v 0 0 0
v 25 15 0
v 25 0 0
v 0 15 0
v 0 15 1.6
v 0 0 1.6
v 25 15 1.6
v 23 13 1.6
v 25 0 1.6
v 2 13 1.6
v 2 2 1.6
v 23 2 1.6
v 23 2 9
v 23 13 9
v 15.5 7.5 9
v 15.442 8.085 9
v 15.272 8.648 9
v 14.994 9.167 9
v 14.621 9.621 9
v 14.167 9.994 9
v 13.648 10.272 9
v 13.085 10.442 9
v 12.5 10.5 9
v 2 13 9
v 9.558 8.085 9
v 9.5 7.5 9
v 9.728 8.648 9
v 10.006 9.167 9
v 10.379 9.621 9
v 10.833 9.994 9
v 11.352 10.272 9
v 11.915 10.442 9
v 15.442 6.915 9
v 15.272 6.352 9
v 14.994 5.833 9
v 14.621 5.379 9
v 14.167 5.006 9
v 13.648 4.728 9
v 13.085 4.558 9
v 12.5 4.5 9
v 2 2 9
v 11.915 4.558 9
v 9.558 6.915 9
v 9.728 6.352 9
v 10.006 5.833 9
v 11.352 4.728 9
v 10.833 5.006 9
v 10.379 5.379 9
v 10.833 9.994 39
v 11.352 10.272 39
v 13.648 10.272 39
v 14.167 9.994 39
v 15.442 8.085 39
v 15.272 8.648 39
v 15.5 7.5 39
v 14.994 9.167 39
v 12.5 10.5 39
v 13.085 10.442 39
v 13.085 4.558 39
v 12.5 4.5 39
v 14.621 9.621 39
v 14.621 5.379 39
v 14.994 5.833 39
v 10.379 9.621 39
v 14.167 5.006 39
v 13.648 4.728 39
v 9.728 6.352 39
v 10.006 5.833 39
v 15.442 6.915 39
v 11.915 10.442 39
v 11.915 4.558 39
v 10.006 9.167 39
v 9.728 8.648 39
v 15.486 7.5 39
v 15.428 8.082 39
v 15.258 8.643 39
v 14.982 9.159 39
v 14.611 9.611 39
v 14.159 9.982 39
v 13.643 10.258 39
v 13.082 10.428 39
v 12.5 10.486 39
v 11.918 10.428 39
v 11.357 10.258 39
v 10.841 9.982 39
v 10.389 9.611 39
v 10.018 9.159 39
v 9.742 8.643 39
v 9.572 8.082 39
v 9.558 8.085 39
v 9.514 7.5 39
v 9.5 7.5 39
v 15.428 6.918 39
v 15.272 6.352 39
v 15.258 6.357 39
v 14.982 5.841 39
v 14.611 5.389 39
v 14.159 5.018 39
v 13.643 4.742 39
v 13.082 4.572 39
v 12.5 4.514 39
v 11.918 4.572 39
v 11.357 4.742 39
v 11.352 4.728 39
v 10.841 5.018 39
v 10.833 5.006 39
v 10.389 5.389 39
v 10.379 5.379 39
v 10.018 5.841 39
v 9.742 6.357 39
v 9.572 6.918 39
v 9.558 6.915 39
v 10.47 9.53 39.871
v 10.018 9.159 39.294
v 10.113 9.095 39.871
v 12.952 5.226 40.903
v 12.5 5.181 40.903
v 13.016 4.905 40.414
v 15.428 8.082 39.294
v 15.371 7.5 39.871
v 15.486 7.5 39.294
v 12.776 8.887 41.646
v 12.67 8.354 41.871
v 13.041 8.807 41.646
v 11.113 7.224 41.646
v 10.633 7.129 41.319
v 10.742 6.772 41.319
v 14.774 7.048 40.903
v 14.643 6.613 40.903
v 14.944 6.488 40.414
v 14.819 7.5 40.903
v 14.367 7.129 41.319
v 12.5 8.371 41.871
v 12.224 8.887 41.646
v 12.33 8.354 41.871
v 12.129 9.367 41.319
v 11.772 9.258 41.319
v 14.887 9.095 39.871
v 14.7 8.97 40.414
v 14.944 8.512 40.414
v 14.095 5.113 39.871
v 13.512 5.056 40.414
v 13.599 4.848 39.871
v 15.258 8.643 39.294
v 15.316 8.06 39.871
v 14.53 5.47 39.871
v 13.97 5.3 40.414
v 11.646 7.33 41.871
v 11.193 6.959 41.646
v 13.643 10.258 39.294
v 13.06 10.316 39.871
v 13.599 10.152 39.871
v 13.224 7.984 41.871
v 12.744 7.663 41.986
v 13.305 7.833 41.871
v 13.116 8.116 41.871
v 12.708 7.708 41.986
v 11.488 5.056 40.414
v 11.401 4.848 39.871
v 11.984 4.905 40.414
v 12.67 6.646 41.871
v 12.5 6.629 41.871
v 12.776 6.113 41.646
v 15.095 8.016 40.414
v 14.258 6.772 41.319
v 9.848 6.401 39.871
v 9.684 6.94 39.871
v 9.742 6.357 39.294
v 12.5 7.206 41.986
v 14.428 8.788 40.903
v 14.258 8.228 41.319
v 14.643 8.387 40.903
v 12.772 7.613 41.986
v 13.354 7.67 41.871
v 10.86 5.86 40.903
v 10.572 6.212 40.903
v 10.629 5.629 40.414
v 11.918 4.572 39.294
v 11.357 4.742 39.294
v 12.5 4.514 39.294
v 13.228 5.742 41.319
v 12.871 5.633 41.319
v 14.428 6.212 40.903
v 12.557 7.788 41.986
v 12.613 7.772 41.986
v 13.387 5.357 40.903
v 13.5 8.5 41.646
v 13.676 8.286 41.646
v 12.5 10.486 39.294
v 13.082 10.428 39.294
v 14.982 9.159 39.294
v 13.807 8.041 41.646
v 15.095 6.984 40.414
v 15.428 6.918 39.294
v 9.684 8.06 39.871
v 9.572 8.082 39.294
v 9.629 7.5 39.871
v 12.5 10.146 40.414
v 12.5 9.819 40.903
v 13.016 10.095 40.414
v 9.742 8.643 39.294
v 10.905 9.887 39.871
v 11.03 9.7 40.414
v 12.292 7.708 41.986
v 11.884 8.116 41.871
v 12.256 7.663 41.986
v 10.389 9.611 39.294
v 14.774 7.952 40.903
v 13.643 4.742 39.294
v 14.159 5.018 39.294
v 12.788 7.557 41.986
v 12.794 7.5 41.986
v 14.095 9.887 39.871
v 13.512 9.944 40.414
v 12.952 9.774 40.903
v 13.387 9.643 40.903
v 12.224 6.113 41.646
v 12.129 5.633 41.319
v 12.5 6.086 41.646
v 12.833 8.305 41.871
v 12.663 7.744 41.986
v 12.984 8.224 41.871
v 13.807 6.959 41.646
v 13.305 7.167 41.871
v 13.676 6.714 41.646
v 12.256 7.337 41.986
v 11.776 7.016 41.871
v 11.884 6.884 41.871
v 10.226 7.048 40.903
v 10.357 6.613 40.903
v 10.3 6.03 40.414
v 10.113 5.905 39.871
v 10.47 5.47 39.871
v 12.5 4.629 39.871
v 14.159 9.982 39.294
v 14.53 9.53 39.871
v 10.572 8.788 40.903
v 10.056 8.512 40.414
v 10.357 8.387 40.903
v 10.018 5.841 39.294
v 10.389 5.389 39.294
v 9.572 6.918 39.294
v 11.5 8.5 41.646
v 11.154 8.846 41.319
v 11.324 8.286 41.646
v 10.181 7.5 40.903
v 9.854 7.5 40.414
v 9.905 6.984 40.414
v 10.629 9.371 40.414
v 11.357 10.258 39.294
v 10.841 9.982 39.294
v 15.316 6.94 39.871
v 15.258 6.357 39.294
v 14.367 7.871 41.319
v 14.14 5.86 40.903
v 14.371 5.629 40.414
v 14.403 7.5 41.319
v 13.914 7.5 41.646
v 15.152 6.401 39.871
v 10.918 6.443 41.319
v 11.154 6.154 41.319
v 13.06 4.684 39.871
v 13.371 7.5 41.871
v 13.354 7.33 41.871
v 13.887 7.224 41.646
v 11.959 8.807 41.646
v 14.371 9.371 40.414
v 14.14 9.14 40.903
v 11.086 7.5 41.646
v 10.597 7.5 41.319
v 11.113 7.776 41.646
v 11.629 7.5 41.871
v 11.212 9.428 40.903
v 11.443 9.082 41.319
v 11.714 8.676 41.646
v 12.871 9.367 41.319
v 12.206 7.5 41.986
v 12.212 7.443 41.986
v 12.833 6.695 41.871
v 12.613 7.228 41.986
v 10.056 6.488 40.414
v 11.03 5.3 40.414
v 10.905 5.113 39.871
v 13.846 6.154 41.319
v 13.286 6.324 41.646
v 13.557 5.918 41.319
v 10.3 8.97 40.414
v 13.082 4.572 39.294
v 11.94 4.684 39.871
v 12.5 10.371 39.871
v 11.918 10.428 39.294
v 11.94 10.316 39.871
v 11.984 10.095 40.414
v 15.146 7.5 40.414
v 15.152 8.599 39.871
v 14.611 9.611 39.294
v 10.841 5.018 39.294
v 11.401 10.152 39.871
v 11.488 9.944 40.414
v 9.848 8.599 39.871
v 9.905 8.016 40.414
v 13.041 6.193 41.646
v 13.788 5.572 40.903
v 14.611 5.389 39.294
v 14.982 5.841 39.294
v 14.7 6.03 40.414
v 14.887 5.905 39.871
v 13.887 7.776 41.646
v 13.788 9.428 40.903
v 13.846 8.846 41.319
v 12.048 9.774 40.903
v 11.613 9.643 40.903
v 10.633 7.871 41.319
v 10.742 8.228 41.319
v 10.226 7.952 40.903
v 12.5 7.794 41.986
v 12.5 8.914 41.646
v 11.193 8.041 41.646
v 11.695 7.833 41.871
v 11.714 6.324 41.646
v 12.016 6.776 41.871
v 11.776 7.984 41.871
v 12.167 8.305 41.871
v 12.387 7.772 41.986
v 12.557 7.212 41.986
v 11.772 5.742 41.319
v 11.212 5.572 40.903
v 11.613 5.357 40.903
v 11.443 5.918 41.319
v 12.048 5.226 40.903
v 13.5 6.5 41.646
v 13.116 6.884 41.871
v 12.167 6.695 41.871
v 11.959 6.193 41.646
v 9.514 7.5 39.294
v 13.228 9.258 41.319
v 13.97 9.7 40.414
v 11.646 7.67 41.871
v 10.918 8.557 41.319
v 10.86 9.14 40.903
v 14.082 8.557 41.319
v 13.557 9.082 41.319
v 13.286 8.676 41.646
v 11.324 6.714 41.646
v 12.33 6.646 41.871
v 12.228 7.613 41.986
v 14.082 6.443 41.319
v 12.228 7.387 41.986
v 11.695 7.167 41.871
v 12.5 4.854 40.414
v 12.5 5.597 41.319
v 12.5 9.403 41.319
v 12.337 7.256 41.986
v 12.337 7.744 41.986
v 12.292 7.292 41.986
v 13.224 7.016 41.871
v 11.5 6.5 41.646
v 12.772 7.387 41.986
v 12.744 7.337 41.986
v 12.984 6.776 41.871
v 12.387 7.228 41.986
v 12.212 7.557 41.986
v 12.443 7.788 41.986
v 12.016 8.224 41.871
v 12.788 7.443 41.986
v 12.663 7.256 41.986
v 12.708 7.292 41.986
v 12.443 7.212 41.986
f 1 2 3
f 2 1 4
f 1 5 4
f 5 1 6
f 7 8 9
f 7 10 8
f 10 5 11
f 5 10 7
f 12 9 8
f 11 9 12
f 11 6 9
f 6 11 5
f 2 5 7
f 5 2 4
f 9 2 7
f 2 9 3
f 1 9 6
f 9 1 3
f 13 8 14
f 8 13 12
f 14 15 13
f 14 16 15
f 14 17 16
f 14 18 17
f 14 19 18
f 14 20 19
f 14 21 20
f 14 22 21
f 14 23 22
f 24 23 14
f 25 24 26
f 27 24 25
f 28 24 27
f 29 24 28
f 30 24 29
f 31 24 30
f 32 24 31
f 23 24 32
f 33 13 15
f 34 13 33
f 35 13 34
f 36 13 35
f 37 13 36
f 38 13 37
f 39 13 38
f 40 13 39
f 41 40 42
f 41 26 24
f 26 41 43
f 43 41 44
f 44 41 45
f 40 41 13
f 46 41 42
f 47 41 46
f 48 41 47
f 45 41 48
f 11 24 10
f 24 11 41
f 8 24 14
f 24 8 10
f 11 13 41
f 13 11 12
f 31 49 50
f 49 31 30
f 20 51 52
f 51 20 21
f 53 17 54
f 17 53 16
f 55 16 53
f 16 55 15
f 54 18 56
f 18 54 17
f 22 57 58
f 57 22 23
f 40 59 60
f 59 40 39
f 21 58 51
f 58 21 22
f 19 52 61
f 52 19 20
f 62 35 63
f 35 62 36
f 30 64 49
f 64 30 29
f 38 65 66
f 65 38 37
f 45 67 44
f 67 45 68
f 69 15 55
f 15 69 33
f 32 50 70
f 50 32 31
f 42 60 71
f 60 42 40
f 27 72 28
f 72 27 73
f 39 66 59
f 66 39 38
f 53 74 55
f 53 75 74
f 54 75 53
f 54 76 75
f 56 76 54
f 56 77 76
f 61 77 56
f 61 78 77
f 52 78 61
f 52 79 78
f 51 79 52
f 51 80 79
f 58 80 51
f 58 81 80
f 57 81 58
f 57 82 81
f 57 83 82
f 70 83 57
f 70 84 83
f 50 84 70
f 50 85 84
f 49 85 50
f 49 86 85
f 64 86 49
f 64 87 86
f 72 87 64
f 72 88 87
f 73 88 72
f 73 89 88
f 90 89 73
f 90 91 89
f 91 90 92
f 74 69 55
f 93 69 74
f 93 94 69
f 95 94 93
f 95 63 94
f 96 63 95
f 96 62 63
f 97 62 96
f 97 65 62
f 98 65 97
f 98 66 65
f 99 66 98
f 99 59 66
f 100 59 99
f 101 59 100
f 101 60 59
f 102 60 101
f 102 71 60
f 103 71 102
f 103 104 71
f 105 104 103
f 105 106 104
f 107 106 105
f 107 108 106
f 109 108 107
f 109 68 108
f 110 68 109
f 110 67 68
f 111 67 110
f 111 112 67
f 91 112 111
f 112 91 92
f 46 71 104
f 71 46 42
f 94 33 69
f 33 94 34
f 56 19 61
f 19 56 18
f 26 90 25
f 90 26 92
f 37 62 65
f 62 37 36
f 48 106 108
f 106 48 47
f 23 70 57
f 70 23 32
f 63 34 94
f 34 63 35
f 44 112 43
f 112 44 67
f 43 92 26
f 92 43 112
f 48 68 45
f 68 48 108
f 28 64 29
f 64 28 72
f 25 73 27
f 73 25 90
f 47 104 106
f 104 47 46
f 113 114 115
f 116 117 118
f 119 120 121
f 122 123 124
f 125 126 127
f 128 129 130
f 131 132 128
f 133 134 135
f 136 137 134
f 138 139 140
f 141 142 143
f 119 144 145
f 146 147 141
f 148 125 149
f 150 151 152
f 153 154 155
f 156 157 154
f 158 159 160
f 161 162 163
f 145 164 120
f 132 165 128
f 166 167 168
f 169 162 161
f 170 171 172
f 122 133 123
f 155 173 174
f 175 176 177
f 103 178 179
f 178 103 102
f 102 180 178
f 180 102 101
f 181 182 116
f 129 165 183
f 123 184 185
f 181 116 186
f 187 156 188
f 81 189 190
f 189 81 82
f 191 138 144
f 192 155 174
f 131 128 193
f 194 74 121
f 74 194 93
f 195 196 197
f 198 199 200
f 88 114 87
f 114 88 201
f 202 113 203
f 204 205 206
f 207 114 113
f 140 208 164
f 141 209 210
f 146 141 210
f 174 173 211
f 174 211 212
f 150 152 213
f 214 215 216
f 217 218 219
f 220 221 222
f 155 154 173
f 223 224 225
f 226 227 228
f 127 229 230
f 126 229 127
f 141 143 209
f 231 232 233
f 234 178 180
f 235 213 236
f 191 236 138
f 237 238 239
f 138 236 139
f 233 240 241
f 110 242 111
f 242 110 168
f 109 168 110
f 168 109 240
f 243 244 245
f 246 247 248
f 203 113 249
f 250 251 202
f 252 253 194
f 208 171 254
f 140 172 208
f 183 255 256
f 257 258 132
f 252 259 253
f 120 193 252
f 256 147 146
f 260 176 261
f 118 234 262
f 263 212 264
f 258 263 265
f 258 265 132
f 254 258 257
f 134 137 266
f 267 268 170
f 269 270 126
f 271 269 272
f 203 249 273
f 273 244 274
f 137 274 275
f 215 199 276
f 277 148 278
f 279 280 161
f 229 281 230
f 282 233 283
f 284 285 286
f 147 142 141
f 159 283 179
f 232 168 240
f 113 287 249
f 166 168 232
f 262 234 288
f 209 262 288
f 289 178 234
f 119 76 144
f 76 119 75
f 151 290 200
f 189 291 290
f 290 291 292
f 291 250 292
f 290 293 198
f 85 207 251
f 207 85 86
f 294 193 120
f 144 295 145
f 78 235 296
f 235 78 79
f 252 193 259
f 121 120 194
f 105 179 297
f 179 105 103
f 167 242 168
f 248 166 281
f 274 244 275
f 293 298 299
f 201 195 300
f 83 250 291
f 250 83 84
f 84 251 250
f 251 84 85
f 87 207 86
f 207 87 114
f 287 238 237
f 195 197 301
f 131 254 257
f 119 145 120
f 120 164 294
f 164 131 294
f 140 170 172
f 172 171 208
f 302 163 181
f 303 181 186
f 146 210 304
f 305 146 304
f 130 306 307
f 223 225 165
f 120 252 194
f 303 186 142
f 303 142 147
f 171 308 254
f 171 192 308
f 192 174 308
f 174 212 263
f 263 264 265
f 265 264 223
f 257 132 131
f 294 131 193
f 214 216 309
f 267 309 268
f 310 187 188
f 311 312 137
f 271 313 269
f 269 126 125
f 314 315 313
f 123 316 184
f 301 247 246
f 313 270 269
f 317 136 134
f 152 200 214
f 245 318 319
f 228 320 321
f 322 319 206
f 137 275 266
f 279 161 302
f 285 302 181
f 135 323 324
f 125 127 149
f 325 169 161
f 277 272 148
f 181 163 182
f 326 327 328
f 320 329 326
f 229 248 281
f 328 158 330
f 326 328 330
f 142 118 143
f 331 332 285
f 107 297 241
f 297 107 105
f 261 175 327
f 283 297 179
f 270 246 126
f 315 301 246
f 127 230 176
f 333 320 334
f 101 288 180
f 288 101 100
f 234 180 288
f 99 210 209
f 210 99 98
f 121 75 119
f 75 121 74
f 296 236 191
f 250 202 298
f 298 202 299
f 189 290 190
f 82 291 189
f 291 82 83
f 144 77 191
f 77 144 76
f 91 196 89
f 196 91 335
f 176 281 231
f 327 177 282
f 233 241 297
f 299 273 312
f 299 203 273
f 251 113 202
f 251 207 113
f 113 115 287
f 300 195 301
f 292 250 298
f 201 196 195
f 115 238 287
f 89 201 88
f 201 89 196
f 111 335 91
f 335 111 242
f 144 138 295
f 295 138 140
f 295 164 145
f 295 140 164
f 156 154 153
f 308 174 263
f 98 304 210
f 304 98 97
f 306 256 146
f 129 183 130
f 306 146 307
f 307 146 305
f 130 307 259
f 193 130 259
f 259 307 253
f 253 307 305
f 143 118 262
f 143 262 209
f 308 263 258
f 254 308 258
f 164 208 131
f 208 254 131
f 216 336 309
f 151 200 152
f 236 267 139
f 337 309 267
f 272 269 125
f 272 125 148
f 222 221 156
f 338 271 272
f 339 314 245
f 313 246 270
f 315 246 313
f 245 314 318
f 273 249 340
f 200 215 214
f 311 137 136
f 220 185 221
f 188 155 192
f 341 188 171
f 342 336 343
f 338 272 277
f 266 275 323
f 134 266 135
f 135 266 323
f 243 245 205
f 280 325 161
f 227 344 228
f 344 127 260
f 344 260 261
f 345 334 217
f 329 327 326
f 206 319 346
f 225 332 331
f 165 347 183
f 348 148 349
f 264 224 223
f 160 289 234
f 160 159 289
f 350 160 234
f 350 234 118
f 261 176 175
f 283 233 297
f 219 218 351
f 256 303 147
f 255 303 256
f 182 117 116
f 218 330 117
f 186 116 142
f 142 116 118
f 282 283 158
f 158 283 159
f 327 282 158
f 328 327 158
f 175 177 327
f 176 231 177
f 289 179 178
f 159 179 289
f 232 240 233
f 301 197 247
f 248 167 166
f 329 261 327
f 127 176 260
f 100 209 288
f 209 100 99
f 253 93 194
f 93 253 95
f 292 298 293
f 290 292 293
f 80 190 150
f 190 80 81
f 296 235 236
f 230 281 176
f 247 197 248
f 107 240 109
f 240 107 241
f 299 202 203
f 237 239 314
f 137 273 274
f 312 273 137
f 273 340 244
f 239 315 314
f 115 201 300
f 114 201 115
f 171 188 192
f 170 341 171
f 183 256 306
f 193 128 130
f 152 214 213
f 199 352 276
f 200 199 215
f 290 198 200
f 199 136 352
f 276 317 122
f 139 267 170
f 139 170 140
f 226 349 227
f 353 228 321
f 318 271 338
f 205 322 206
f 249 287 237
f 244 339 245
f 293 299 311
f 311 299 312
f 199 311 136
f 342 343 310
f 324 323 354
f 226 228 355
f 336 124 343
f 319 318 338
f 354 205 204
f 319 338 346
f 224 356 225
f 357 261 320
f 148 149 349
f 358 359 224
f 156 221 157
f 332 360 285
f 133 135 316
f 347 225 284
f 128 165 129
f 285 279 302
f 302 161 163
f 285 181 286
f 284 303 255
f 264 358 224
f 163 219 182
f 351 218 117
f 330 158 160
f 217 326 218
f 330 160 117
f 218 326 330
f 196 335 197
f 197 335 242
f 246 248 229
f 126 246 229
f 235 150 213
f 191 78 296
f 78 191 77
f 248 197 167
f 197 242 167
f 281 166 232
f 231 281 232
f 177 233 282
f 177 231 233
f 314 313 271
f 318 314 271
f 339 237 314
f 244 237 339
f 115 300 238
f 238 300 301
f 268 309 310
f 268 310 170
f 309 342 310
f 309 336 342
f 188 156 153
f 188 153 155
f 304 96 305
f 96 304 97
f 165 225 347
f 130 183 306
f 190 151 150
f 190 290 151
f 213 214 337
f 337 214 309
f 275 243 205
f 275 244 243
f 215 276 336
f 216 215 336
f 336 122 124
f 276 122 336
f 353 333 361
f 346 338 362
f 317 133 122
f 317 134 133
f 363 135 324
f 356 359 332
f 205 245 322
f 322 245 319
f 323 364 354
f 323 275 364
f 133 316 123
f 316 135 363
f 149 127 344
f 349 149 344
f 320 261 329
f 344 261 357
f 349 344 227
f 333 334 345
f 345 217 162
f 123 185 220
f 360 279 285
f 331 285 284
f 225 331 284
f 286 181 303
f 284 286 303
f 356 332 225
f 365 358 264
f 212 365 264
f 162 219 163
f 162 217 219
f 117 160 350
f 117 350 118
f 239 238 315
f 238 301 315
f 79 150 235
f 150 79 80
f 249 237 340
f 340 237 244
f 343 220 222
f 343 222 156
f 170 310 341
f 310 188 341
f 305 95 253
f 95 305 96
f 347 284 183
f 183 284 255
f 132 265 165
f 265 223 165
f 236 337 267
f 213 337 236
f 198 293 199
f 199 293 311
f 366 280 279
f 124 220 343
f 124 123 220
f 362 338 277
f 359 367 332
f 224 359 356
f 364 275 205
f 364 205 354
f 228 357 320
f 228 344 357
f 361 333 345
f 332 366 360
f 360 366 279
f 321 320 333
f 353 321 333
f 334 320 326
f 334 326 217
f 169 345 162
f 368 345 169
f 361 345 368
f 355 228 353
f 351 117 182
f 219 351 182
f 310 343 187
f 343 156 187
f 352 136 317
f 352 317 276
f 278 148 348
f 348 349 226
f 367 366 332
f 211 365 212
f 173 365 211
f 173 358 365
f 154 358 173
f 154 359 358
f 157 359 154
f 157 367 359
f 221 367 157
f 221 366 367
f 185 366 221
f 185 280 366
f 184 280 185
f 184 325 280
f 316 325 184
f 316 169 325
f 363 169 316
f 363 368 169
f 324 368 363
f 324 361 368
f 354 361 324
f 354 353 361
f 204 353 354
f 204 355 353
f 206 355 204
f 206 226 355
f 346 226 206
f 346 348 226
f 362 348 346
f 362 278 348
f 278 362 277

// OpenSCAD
/* =============================================================================
 * 智慧香爐 — 外購元件：MAX6675 熱電偶轉換板 ＋ K 型探頭
 * =============================================================================
 * ★★ 這不是列印件，是外購品的示意模型 ★★
 * 尺寸來自 ../params.scad，★全為估值★。
 * 用途：組裝干涉檢查、螺絲可及性、目視確認裝得下。
 * ★不可當成實際尺寸寫進報告★（CLAUDE.md §7）
 *
 * 原點：轉換板左下角、z=0 為板底
 * ============================================================================= */

include <../params.scad>


module max6675_board() {
    color("#c0392b") linear_extrude(PCB_T) square([MAX6675_W, MAX6675_D]);
    color("#1a1a1a")
        translate([2, 2, PCB_T]) cube([MAX6675_W - 4, MAX6675_D - 4, MAX6675_H - PCB_T]);
}

// K 型探頭：★目前外觀 CAD 沒有任何支架把它固定在爐面上方★
// 交接文件要求懸於爐面上方 TC_TIP_ABOVE_BOWL，這裡把它畫出來，
// 是為了讓「缺少的支架」在組合件裡看得見，不是宣稱它已經有著落。
module tc_probe(len = 30) {
    color("#9aa0a6") cylinder(h = len, d = TC_PROBE_D, $fn = 32);
    color("#9aa0a6") translate([0, 0, len]) sphere(d = TC_PROBE_D, $fn = 32);
}

module max6675() {
    max6675_board();
    translate([MAX6675_W / 2, MAX6675_D / 2, MAX6675_H]) tc_probe(30);
}

// ── 單獨開檔時的預覽（被 use<> 引入時不執行）──
max6675();
